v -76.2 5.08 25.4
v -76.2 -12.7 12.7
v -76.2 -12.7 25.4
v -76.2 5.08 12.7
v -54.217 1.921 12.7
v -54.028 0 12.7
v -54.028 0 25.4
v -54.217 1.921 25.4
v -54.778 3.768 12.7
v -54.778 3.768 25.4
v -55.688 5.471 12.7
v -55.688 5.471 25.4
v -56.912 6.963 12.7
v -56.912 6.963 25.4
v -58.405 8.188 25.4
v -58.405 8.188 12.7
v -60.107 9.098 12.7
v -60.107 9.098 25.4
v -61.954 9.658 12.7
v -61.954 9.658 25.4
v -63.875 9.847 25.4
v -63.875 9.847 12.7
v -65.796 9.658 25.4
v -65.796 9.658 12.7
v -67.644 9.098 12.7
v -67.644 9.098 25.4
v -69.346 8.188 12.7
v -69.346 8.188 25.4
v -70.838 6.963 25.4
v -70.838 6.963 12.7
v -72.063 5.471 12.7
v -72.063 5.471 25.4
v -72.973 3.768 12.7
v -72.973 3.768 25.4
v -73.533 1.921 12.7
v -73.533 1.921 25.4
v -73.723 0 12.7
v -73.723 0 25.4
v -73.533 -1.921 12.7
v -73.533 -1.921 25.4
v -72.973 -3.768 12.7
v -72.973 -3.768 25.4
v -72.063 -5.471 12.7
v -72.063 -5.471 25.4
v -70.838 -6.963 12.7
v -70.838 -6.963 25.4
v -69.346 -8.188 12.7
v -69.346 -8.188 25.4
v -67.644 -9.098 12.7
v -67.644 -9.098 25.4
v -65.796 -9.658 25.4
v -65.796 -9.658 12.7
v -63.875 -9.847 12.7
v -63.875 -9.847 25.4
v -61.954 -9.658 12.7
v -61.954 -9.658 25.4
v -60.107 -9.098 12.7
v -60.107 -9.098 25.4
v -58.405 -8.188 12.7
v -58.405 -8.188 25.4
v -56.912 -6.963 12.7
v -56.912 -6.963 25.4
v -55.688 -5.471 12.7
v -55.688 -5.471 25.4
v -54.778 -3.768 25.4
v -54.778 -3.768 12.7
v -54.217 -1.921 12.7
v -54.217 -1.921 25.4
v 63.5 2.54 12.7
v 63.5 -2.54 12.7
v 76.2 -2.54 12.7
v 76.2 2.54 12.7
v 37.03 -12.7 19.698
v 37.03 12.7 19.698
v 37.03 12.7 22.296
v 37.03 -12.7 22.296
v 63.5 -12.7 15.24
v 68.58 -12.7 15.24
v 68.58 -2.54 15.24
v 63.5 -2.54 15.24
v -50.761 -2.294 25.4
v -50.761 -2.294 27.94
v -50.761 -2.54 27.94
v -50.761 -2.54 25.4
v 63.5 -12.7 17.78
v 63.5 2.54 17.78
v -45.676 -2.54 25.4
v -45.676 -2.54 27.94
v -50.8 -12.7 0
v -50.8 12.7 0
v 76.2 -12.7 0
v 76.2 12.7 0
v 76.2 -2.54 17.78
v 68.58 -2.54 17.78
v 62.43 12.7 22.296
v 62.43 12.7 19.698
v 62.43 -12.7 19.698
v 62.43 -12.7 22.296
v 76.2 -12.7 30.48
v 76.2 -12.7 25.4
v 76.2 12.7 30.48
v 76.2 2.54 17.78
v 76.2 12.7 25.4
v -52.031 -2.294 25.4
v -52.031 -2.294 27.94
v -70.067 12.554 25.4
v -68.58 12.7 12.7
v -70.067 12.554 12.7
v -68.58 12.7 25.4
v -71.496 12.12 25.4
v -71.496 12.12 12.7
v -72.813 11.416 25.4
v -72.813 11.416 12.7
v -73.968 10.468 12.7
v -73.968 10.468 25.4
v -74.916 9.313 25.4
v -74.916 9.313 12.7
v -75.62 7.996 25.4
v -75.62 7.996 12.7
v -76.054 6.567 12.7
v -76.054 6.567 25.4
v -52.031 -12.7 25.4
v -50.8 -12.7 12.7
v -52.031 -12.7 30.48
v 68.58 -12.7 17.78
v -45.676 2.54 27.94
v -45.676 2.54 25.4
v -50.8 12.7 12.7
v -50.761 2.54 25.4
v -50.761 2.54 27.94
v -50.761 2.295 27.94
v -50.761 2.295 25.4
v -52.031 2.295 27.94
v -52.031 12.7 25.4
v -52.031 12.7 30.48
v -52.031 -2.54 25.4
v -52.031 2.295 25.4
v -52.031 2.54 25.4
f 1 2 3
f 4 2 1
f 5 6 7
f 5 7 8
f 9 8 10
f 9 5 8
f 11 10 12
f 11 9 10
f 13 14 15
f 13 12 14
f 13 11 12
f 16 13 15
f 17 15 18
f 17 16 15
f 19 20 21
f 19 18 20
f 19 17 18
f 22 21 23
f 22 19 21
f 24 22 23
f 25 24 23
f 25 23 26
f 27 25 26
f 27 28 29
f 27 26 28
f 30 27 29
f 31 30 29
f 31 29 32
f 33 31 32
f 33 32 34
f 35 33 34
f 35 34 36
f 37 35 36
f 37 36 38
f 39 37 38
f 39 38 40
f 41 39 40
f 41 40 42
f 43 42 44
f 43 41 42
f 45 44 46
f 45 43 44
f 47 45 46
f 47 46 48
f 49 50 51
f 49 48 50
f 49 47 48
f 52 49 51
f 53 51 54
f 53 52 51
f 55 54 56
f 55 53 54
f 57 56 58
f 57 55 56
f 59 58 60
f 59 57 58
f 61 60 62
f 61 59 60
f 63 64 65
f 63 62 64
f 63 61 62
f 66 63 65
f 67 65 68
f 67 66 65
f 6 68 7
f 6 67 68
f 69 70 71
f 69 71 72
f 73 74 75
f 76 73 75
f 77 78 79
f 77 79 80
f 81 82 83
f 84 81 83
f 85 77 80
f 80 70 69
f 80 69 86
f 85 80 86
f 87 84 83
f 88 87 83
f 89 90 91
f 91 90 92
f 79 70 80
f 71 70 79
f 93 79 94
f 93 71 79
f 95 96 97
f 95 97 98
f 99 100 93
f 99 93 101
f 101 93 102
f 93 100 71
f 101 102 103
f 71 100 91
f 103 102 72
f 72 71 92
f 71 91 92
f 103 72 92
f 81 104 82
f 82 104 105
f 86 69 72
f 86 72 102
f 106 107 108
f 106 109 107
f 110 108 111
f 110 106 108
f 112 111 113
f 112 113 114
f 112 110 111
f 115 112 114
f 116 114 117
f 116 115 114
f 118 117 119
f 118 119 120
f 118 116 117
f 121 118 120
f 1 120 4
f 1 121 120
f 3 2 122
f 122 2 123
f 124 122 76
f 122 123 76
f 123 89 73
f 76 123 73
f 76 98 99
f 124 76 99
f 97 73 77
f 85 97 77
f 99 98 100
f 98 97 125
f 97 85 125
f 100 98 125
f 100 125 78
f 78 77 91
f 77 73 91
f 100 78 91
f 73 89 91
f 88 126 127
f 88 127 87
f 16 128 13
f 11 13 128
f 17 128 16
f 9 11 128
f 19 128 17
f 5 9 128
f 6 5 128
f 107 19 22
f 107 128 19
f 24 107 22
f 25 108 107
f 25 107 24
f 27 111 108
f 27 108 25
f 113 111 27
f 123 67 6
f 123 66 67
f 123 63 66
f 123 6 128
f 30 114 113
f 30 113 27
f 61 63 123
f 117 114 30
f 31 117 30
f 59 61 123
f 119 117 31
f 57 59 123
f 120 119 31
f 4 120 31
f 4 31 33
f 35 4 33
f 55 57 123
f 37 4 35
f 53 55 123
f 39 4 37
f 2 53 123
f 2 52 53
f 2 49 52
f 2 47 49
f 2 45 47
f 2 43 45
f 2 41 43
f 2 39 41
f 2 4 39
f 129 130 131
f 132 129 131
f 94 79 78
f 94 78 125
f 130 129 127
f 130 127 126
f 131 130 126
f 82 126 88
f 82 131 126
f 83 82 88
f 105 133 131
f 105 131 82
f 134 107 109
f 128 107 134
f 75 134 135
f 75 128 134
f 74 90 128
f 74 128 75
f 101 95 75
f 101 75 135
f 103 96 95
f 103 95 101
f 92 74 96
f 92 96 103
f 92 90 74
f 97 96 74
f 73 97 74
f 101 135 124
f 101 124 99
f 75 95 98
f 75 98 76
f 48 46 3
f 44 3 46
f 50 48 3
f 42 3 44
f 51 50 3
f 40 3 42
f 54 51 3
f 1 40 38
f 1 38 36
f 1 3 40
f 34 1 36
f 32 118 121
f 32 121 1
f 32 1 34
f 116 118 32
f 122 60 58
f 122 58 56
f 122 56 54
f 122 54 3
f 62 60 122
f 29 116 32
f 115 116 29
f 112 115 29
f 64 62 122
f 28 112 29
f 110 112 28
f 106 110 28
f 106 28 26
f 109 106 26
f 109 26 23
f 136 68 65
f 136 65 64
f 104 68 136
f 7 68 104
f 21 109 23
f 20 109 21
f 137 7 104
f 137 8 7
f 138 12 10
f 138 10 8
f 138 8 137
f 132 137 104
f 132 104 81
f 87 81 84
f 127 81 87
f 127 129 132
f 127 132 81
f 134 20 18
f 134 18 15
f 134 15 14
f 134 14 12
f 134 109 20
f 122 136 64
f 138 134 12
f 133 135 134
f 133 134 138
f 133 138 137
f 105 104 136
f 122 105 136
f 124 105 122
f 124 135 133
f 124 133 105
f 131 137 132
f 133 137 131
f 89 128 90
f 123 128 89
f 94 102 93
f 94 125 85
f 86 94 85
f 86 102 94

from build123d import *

# Parameters (mm, degrees)
F1_W      = 152.4
F1_H      = 25.4
F2_DEPTH  = 25.4
F3_R      = 9.8472712537
F4_DEPTH  = 25.401
F5_W      = 25.4
F5_H      = 12.7
F6_DEPTH  = 25.4
F7_W      = 25.4
F7_H      = 2.5977271069
F8_DEPTH  = 53.086
F9_W      = 128.2310737193
F9_H      = 25.4
F10_DEPTH = 5.08
F11_R     = 7.62
F12_W     = 5.08
F12_H     = 2.54
F13_DEPTH = 6.35508
F14_W     = 0.2449715817
F14_H     = 2.54
F15_DEPTH = 1.27
F14_W_2   = 0.2464826526
F16_DEPTH = 1.27
F17_W     = 5.08
F17_H     = 5.08
F18_DEPTH = 12.7
F19_W     = 5.08
F19_H     = 2.54
F20_DEPTH = 25.4


with BuildPart() as f2:
    # F1 (on face) → F2 (new body)
    with BuildSketch(Plane.XY):
        Rectangle(F1_W, F1_H)
    extrude(amount=F2_DEPTH)

    # F3 (on face) → F4 (cut, through all)
    with BuildSketch(Plane.XY):
        with Locations((-63.8753846288, 0)):
            Circle(F3_R)
    extrude(amount=F4_DEPTH, mode=Mode.SUBTRACT)

    # F5 (on face) → F6 (cut)
    with BuildSketch(Plane(origin=(-76.2, 0, 0), x_dir=(0, -1, 0), z_dir=(-1, 0, 0))):
        with Locations((0, 6.35)):
            Rectangle(F5_W, F5_H)
    extrude(amount=-F6_DEPTH, mode=Mode.SUBTRACT)

    # F7 (on face) → F8 (cut)
    with BuildSketch(Plane(origin=(0, 12.7, 0), x_dir=(-1, 0, 0), z_dir=(0, 1, 0))):
        with Locations((-49.7299730778, 20.9970995784)):
            Rectangle(F7_W, F7_H)
    extrude(amount=-F8_DEPTH, mode=Mode.SUBTRACT)

    # F9 (on face) → F10 (join)
    with BuildSketch(Plane.XY.offset(25.4)):
        with Locations((12.0844631404, 0)):
            Rectangle(F9_W, F9_H)
    extrude(amount=F10_DEPTH)

    # F11
    f11_edges = [f2.edges().sort_by_distance(p)[0] for p in [
        (-76.2, 12.7, 19.05),
    ]]
    fillet(f11_edges, radius=F11_R)

    # F12 (on face) → F13 (cut)
    with BuildSketch(Plane(origin=(-52.0310737193, 0, 0), x_dir=(0, -1, 0), z_dir=(-1, 0, 0))):
        with Locations((0, 26.67)):
            Rectangle(F12_W, F12_H)
    extrude(amount=-F13_DEPTH, mode=Mode.SUBTRACT)

    # F14 (on face) → F15 (join)
    with BuildSketch(Plane(origin=(-52.0310737193, 0, 0), x_dir=(0, -1, 0), z_dir=(-1, 0, 0))):
        with Locations((-2.4175142092, 26.67)):
            Rectangle(F14_W, F14_H)
    extrude(amount=-F15_DEPTH)

    # F14 (on face) → F16 (join)
    with BuildSketch(Plane(origin=(-52.0310737193, 0, 0), x_dir=(0, -1, 0), z_dir=(-1, 0, 0))):
        with Locations((2.4167586737, 26.67)):
            Rectangle(F14_W_2, F14_H)
    extrude(amount=-F16_DEPTH)

    # F17 (on face) → F18 (cut)
    with BuildSketch(Plane.YZ.offset(76.2)):
        with Locations((0, 15.24)):
            Rectangle(F17_W, F17_H)
    extrude(amount=-F18_DEPTH, mode=Mode.SUBTRACT)

    # F19 (on face) → F20 (cut)
    with BuildSketch(Plane(origin=(0, -2.54, 0), x_dir=(-1, 0, 0), z_dir=(0, 1, 0))):
        with Locations((-66.04, 16.51)):
            Rectangle(F19_W, F19_H)
    extrude(amount=-F20_DEPTH, mode=Mode.SUBTRACT)


solid = f2.part
